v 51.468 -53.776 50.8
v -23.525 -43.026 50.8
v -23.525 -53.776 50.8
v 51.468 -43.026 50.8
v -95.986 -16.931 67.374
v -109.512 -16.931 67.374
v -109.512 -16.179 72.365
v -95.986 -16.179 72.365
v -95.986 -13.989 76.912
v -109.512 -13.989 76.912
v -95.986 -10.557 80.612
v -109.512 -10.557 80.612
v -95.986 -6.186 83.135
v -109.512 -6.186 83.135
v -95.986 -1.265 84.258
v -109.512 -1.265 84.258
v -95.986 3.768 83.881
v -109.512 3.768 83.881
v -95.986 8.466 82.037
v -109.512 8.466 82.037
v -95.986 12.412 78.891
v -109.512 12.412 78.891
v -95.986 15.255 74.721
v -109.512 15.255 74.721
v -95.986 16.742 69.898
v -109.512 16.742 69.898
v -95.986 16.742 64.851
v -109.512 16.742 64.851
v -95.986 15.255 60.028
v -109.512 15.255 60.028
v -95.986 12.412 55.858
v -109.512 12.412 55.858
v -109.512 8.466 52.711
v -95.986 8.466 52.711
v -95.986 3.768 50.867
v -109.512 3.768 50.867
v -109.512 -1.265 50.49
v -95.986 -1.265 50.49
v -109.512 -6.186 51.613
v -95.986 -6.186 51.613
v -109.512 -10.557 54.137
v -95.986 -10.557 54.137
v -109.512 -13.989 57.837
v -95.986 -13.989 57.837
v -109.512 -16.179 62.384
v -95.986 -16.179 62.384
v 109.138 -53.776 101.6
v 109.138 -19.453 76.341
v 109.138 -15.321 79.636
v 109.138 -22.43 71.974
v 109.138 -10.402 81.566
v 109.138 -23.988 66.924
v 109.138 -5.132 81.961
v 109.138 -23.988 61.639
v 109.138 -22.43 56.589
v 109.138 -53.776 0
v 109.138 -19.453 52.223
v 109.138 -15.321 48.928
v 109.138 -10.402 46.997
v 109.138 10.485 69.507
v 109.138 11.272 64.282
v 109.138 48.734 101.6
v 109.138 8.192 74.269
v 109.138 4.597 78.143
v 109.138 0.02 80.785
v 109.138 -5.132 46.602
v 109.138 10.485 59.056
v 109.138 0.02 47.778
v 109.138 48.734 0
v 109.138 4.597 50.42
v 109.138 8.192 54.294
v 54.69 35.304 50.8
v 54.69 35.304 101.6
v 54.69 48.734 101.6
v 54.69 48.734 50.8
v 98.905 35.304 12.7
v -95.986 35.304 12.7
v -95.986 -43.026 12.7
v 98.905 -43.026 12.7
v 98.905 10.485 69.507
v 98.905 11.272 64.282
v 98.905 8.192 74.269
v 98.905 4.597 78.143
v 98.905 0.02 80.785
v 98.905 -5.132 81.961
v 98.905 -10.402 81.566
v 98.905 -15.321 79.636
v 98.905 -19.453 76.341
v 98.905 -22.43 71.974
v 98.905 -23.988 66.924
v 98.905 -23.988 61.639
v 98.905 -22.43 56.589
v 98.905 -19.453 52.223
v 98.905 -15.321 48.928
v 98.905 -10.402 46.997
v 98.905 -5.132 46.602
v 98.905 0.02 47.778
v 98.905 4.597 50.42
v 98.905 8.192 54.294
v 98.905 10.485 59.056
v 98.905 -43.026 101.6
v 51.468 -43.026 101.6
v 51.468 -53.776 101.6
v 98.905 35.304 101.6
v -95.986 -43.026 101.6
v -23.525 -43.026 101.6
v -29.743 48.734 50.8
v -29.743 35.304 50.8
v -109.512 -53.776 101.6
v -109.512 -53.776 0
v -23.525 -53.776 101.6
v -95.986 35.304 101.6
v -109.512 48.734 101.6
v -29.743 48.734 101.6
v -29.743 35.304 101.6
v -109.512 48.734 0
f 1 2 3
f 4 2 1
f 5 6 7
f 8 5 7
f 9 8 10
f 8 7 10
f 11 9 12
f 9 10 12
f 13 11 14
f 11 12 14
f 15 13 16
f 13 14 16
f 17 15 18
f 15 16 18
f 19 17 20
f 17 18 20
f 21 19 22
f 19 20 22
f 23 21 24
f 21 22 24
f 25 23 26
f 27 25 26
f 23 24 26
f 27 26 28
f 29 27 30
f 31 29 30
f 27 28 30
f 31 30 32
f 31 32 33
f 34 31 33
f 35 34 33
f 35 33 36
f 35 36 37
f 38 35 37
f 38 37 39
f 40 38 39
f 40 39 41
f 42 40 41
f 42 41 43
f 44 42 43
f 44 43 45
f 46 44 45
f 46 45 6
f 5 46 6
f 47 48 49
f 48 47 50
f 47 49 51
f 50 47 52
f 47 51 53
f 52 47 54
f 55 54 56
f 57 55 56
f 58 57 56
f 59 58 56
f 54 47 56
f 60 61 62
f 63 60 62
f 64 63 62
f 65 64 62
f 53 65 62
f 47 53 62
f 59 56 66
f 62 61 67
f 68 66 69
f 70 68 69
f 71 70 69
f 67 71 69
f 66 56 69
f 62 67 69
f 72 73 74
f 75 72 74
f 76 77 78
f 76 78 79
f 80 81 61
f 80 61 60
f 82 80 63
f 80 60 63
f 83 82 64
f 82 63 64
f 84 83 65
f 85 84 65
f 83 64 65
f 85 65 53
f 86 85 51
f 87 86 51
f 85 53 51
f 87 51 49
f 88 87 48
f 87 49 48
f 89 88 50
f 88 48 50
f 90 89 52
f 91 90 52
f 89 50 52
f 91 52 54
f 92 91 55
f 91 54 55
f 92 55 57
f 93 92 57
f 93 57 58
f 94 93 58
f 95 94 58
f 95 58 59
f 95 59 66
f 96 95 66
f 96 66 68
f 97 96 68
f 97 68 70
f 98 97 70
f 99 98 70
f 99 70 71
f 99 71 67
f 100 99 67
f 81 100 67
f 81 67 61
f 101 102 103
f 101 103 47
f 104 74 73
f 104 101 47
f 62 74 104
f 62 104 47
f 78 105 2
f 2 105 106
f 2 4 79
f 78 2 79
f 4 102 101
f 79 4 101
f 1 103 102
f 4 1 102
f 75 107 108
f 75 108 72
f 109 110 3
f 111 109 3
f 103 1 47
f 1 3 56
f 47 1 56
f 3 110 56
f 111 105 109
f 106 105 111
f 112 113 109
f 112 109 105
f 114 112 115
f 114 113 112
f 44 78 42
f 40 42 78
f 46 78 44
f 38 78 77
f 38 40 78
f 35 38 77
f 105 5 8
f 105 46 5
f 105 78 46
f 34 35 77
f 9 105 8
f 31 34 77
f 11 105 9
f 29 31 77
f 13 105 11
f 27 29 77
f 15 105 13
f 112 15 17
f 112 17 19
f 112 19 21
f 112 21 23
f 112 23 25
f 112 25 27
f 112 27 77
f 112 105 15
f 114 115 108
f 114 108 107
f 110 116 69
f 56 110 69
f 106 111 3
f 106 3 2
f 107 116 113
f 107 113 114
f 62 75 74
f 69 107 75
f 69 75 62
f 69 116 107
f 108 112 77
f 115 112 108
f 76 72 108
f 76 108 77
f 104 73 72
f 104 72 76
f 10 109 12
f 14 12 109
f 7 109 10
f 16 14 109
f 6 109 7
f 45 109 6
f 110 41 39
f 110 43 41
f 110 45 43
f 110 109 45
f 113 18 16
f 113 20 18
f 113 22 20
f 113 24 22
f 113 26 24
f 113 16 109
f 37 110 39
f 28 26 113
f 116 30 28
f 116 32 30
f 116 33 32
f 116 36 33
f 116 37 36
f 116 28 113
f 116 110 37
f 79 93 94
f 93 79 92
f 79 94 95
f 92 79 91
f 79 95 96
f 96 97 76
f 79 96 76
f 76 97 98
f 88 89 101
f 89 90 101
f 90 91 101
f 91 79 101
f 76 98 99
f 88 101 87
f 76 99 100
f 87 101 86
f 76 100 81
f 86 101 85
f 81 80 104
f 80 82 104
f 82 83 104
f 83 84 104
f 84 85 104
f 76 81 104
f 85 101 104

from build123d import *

# Parameters (mm, degrees)
F0_W     = 218.6504378915
F0_H     = 102.5099009275
F1_DEPTH = 101.6
F2_W     = 194.8913782835
F2_H     = 78.3294849098
F3_DEPTH = 88.9
F4_W     = 84.4324864447
F4_H     = 13.4305804968
F4_W_2   = 74.9933160841
F4_H_2   = 10.749835521
F5_DEPTH = 50.8
F6_R     = 16.9313597919
F7_DEPTH = 25.4
F8_R     = 17.7291047607
F9_DEPTH = 25.4


with BuildPart() as f1:
    # F0 (on Top) → F1 (new body)
    with BuildSketch(Plane.XY):
        with Locations((-0.1867227256, -2.5207363069)):
            Rectangle(F0_W, F0_H)
    extrude(amount=F1_DEPTH)

    # F2 (on face) → F3 (cut)
    with BuildSketch(Plane.XY.offset(101.6)):
        with Locations((1.4596879482, -3.8611087948)):
            Rectangle(F2_W, F2_H)
    extrude(amount=-F3_DEPTH, mode=Mode.SUBTRACT)

    # F4 (on face) → F5 (cut)
    with BuildSketch(Plane.XY.offset(101.6)):
        with Locations((12.4733056873, 42.0189239085)):
            Rectangle(F4_W, F4_H)
        with Locations((13.9715243131, -48.4007690102)):
            Rectangle(F4_W_2, F4_H_2)
    extrude(amount=-F5_DEPTH, mode=Mode.SUBTRACT)

    # F6 (on face) → F7 (cut)
    with BuildSketch(Plane(origin=(-109.5119416714, 0, 0), x_dir=(0, -1, 0), z_dir=(-1, 0, 0))):
        with Locations((0, 67.3742890358)):
            Circle(F6_R)
    extrude(amount=-F7_DEPTH, mode=Mode.SUBTRACT)

    # F8 (on face) → F9 (cut)
    with BuildSketch(Plane.YZ.offset(109.1384962201)):
        with Locations((-6.4566782676, 64.2816573381)):
            Circle(F8_R)
    extrude(amount=-F9_DEPTH, mode=Mode.SUBTRACT)


solid = f1.part
